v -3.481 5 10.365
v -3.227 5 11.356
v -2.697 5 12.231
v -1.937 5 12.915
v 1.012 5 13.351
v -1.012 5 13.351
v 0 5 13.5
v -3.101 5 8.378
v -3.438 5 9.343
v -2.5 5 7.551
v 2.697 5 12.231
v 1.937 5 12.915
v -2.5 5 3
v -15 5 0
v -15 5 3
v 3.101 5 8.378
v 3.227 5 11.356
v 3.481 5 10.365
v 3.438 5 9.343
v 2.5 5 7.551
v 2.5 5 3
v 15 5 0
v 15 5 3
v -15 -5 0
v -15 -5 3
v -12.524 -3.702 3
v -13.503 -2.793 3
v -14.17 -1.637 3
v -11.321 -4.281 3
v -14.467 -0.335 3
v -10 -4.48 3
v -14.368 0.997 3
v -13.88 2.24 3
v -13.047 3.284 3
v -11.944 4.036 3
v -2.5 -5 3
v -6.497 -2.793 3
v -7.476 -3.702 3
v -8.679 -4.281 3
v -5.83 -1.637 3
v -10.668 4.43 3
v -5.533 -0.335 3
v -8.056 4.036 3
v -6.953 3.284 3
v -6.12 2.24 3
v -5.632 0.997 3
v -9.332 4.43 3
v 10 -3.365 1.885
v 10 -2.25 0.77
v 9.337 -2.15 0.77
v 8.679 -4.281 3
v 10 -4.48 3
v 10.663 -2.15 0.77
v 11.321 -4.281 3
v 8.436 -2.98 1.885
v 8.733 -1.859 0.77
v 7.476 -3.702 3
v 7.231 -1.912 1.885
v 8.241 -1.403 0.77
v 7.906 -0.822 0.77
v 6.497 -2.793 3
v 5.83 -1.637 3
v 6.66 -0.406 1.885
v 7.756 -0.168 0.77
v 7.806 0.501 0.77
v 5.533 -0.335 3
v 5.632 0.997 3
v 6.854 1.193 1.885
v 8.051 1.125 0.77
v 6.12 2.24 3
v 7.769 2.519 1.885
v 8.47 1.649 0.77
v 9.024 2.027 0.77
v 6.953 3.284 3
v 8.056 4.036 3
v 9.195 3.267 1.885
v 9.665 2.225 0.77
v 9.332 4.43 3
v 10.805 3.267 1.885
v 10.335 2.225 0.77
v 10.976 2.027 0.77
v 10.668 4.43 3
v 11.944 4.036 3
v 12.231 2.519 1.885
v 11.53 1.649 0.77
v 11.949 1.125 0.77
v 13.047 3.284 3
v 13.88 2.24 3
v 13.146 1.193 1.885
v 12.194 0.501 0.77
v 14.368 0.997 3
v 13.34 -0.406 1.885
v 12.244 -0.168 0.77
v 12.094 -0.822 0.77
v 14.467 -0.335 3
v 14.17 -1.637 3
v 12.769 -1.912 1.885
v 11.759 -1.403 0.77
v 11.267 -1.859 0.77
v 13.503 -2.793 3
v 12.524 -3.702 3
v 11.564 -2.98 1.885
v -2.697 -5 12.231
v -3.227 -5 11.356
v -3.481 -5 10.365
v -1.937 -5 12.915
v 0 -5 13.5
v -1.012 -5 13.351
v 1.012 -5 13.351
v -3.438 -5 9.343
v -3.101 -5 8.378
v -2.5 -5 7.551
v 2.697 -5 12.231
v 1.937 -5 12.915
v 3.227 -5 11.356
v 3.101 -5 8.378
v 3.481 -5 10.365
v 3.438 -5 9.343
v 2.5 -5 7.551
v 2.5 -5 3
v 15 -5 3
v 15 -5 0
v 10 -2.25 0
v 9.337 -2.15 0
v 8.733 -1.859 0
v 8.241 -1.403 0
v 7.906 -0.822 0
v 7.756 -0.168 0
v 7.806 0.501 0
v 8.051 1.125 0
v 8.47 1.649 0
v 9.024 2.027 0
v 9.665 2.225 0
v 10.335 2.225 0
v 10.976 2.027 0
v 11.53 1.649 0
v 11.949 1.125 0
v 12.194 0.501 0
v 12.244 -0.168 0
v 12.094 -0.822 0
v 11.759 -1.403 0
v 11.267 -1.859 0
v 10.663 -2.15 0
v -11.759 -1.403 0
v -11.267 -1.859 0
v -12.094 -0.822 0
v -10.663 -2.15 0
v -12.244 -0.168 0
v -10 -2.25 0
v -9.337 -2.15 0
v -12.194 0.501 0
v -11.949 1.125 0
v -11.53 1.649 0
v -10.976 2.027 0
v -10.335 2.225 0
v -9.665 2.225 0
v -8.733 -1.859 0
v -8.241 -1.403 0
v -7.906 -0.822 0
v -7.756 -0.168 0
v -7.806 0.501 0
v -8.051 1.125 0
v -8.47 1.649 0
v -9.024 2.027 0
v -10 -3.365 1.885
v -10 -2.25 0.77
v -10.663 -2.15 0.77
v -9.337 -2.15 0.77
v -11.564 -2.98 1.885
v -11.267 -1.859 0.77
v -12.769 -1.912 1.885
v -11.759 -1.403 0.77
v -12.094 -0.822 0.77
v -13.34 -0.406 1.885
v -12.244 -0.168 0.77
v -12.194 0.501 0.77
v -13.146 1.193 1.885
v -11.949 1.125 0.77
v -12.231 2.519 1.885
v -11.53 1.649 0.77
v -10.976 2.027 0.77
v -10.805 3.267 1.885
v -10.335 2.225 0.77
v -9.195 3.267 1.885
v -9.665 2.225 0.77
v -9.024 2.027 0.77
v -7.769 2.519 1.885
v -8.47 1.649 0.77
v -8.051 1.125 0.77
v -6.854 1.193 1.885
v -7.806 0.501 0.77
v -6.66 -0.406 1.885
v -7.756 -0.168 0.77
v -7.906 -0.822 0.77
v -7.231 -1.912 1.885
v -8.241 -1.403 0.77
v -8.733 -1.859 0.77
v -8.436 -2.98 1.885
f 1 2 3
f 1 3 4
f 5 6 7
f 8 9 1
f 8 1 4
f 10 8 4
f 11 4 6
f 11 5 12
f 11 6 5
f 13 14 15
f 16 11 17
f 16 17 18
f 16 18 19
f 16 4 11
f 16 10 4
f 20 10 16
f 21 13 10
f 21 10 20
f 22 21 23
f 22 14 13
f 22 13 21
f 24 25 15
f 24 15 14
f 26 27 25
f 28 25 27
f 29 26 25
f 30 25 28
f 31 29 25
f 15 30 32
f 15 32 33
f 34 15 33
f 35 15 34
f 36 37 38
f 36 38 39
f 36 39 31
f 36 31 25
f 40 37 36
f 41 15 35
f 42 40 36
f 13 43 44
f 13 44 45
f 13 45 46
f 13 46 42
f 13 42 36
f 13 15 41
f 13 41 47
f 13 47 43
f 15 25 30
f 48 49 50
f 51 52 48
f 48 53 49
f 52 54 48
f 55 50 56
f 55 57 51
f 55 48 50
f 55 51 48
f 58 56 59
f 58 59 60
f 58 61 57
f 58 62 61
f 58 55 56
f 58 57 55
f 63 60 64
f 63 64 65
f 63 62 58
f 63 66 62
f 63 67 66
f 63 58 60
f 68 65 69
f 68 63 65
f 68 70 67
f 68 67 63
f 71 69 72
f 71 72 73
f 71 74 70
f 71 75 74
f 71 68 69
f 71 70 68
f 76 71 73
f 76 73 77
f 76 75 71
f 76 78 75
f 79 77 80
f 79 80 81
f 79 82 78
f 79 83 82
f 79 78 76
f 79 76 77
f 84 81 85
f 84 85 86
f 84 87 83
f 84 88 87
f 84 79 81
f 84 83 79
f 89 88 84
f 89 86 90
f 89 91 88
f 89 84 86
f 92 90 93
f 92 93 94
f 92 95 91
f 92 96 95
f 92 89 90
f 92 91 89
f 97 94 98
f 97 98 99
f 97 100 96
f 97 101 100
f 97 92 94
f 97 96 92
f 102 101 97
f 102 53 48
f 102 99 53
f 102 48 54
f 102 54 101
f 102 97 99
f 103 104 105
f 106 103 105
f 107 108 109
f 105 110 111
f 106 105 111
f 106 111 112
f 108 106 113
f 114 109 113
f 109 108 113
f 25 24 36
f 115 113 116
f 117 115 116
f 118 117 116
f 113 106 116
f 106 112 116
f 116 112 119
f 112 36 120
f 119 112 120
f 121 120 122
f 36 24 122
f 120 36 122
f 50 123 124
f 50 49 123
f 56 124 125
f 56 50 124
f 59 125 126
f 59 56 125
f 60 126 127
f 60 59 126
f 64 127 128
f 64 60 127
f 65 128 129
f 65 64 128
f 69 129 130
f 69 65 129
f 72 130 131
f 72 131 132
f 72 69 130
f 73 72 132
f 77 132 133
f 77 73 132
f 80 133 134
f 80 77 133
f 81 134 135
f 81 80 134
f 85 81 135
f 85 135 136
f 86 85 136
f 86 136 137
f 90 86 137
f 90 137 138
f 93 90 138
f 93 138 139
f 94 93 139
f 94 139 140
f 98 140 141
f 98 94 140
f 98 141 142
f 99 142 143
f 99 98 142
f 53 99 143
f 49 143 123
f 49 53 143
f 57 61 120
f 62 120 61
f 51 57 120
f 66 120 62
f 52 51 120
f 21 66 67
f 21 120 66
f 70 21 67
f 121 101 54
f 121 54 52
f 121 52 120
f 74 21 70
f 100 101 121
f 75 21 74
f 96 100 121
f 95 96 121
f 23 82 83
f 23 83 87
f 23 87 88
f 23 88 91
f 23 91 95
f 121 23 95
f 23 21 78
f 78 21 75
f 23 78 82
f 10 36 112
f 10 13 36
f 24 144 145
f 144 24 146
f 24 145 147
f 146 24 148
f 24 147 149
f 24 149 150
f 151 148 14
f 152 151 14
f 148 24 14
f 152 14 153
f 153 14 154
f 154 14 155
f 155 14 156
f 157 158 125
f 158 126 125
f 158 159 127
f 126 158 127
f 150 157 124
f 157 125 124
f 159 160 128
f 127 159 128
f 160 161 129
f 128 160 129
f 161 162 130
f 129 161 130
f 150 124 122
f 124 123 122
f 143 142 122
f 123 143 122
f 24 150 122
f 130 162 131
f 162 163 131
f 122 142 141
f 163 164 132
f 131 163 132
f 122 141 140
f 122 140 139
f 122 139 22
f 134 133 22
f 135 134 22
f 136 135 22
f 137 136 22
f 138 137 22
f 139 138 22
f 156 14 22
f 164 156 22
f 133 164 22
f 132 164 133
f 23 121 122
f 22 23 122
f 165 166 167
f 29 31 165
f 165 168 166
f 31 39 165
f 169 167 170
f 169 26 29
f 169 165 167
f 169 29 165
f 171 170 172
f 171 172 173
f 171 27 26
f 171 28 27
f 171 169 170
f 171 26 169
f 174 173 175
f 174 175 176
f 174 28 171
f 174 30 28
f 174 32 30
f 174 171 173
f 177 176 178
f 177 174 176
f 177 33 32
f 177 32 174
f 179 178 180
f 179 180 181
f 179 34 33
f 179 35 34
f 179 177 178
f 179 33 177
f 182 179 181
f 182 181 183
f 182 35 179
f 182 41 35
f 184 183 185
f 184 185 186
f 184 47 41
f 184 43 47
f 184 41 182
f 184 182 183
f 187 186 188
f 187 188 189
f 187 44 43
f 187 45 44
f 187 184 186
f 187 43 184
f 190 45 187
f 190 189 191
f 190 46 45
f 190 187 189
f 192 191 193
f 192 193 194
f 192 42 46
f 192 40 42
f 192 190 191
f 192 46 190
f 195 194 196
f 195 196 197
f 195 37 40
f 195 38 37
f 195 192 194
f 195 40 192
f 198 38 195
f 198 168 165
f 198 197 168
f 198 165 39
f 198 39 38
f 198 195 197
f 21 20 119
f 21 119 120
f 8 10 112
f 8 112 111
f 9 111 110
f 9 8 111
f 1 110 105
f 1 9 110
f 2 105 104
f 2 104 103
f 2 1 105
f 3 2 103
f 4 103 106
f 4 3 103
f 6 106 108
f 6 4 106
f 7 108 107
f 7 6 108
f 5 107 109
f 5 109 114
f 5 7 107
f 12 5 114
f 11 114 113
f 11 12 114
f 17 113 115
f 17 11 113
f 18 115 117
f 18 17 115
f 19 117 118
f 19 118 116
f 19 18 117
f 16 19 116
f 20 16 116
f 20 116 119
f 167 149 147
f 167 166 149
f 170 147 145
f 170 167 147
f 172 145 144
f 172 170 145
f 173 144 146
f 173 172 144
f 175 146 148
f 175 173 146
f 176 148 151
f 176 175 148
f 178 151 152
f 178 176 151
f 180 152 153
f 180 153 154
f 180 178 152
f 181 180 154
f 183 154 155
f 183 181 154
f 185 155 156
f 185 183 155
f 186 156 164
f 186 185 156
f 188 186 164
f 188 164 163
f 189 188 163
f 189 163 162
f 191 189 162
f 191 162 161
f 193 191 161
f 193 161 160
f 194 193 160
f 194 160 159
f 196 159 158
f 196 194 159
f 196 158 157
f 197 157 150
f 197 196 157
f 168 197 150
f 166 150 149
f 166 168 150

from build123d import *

# Parameters (mm, degrees)
SKETCH_1_W                  = 30
SKETCH_1_H                  = 3
EXTRUDE_1_DEPTH             = 5
HOLE_WIZARD_M4_1_AT_2_COUNT = 2
HOLE_WIZARD_M4_1_AT_2_PITCH = 20


with BuildPart() as part:
    # 草图1 → 拉伸1 (new, symmetric)
    with BuildSketch(Plane(origin=(0, 0, 0), x_dir=(1, 0, 0), z_dir=(0, 1, 0))):
        with BuildLine():
            Line((2.5, -3), (-2.5, -3))
            Line((-2.5, -3), (-2.5, -7.550510257))
            ThreePointArc((-2.5, -7.550510257), (0, -13.5), (2.5, -7.550510257))
            Line((2.5, -7.550510257), (2.5, -3))
        make_face()
        with Locations((0, -1.5)):
            Rectangle(SKETCH_1_W, SKETCH_1_H)
    extrude(amount=EXTRUDE_1_DEPTH, both=True)

    # 草图2 → M4 六角凹锥坑螺钉的锥形沉头孔1 (revolve, cut)
    with BuildSketch(Plane(origin=(-10, 0, 3), x_dir=(0, -1, 0), z_dir=(1, 0, 0))):
        Polygon((0, 0), (0, 3), (2.25, 3), (2.25, 2.23), (4.48, 0), align=None)
    hole_wizard_m4_1 = revolve(axis=Axis((-10, 0, 9.35), (0, 0, -1)), mode=Mode.SUBTRACT)

    # M4 六角凹锥坑螺钉的锥形沉头孔1 at 2: M4 六角凹锥坑螺钉的锥形沉头孔1 ×2
    with Locations(*[(i * HOLE_WIZARD_M4_1_AT_2_PITCH, 0, 0) for i in range(1, HOLE_WIZARD_M4_1_AT_2_COUNT)]):
        add(hole_wizard_m4_1, mode=Mode.SUBTRACT)


solid = part.part
